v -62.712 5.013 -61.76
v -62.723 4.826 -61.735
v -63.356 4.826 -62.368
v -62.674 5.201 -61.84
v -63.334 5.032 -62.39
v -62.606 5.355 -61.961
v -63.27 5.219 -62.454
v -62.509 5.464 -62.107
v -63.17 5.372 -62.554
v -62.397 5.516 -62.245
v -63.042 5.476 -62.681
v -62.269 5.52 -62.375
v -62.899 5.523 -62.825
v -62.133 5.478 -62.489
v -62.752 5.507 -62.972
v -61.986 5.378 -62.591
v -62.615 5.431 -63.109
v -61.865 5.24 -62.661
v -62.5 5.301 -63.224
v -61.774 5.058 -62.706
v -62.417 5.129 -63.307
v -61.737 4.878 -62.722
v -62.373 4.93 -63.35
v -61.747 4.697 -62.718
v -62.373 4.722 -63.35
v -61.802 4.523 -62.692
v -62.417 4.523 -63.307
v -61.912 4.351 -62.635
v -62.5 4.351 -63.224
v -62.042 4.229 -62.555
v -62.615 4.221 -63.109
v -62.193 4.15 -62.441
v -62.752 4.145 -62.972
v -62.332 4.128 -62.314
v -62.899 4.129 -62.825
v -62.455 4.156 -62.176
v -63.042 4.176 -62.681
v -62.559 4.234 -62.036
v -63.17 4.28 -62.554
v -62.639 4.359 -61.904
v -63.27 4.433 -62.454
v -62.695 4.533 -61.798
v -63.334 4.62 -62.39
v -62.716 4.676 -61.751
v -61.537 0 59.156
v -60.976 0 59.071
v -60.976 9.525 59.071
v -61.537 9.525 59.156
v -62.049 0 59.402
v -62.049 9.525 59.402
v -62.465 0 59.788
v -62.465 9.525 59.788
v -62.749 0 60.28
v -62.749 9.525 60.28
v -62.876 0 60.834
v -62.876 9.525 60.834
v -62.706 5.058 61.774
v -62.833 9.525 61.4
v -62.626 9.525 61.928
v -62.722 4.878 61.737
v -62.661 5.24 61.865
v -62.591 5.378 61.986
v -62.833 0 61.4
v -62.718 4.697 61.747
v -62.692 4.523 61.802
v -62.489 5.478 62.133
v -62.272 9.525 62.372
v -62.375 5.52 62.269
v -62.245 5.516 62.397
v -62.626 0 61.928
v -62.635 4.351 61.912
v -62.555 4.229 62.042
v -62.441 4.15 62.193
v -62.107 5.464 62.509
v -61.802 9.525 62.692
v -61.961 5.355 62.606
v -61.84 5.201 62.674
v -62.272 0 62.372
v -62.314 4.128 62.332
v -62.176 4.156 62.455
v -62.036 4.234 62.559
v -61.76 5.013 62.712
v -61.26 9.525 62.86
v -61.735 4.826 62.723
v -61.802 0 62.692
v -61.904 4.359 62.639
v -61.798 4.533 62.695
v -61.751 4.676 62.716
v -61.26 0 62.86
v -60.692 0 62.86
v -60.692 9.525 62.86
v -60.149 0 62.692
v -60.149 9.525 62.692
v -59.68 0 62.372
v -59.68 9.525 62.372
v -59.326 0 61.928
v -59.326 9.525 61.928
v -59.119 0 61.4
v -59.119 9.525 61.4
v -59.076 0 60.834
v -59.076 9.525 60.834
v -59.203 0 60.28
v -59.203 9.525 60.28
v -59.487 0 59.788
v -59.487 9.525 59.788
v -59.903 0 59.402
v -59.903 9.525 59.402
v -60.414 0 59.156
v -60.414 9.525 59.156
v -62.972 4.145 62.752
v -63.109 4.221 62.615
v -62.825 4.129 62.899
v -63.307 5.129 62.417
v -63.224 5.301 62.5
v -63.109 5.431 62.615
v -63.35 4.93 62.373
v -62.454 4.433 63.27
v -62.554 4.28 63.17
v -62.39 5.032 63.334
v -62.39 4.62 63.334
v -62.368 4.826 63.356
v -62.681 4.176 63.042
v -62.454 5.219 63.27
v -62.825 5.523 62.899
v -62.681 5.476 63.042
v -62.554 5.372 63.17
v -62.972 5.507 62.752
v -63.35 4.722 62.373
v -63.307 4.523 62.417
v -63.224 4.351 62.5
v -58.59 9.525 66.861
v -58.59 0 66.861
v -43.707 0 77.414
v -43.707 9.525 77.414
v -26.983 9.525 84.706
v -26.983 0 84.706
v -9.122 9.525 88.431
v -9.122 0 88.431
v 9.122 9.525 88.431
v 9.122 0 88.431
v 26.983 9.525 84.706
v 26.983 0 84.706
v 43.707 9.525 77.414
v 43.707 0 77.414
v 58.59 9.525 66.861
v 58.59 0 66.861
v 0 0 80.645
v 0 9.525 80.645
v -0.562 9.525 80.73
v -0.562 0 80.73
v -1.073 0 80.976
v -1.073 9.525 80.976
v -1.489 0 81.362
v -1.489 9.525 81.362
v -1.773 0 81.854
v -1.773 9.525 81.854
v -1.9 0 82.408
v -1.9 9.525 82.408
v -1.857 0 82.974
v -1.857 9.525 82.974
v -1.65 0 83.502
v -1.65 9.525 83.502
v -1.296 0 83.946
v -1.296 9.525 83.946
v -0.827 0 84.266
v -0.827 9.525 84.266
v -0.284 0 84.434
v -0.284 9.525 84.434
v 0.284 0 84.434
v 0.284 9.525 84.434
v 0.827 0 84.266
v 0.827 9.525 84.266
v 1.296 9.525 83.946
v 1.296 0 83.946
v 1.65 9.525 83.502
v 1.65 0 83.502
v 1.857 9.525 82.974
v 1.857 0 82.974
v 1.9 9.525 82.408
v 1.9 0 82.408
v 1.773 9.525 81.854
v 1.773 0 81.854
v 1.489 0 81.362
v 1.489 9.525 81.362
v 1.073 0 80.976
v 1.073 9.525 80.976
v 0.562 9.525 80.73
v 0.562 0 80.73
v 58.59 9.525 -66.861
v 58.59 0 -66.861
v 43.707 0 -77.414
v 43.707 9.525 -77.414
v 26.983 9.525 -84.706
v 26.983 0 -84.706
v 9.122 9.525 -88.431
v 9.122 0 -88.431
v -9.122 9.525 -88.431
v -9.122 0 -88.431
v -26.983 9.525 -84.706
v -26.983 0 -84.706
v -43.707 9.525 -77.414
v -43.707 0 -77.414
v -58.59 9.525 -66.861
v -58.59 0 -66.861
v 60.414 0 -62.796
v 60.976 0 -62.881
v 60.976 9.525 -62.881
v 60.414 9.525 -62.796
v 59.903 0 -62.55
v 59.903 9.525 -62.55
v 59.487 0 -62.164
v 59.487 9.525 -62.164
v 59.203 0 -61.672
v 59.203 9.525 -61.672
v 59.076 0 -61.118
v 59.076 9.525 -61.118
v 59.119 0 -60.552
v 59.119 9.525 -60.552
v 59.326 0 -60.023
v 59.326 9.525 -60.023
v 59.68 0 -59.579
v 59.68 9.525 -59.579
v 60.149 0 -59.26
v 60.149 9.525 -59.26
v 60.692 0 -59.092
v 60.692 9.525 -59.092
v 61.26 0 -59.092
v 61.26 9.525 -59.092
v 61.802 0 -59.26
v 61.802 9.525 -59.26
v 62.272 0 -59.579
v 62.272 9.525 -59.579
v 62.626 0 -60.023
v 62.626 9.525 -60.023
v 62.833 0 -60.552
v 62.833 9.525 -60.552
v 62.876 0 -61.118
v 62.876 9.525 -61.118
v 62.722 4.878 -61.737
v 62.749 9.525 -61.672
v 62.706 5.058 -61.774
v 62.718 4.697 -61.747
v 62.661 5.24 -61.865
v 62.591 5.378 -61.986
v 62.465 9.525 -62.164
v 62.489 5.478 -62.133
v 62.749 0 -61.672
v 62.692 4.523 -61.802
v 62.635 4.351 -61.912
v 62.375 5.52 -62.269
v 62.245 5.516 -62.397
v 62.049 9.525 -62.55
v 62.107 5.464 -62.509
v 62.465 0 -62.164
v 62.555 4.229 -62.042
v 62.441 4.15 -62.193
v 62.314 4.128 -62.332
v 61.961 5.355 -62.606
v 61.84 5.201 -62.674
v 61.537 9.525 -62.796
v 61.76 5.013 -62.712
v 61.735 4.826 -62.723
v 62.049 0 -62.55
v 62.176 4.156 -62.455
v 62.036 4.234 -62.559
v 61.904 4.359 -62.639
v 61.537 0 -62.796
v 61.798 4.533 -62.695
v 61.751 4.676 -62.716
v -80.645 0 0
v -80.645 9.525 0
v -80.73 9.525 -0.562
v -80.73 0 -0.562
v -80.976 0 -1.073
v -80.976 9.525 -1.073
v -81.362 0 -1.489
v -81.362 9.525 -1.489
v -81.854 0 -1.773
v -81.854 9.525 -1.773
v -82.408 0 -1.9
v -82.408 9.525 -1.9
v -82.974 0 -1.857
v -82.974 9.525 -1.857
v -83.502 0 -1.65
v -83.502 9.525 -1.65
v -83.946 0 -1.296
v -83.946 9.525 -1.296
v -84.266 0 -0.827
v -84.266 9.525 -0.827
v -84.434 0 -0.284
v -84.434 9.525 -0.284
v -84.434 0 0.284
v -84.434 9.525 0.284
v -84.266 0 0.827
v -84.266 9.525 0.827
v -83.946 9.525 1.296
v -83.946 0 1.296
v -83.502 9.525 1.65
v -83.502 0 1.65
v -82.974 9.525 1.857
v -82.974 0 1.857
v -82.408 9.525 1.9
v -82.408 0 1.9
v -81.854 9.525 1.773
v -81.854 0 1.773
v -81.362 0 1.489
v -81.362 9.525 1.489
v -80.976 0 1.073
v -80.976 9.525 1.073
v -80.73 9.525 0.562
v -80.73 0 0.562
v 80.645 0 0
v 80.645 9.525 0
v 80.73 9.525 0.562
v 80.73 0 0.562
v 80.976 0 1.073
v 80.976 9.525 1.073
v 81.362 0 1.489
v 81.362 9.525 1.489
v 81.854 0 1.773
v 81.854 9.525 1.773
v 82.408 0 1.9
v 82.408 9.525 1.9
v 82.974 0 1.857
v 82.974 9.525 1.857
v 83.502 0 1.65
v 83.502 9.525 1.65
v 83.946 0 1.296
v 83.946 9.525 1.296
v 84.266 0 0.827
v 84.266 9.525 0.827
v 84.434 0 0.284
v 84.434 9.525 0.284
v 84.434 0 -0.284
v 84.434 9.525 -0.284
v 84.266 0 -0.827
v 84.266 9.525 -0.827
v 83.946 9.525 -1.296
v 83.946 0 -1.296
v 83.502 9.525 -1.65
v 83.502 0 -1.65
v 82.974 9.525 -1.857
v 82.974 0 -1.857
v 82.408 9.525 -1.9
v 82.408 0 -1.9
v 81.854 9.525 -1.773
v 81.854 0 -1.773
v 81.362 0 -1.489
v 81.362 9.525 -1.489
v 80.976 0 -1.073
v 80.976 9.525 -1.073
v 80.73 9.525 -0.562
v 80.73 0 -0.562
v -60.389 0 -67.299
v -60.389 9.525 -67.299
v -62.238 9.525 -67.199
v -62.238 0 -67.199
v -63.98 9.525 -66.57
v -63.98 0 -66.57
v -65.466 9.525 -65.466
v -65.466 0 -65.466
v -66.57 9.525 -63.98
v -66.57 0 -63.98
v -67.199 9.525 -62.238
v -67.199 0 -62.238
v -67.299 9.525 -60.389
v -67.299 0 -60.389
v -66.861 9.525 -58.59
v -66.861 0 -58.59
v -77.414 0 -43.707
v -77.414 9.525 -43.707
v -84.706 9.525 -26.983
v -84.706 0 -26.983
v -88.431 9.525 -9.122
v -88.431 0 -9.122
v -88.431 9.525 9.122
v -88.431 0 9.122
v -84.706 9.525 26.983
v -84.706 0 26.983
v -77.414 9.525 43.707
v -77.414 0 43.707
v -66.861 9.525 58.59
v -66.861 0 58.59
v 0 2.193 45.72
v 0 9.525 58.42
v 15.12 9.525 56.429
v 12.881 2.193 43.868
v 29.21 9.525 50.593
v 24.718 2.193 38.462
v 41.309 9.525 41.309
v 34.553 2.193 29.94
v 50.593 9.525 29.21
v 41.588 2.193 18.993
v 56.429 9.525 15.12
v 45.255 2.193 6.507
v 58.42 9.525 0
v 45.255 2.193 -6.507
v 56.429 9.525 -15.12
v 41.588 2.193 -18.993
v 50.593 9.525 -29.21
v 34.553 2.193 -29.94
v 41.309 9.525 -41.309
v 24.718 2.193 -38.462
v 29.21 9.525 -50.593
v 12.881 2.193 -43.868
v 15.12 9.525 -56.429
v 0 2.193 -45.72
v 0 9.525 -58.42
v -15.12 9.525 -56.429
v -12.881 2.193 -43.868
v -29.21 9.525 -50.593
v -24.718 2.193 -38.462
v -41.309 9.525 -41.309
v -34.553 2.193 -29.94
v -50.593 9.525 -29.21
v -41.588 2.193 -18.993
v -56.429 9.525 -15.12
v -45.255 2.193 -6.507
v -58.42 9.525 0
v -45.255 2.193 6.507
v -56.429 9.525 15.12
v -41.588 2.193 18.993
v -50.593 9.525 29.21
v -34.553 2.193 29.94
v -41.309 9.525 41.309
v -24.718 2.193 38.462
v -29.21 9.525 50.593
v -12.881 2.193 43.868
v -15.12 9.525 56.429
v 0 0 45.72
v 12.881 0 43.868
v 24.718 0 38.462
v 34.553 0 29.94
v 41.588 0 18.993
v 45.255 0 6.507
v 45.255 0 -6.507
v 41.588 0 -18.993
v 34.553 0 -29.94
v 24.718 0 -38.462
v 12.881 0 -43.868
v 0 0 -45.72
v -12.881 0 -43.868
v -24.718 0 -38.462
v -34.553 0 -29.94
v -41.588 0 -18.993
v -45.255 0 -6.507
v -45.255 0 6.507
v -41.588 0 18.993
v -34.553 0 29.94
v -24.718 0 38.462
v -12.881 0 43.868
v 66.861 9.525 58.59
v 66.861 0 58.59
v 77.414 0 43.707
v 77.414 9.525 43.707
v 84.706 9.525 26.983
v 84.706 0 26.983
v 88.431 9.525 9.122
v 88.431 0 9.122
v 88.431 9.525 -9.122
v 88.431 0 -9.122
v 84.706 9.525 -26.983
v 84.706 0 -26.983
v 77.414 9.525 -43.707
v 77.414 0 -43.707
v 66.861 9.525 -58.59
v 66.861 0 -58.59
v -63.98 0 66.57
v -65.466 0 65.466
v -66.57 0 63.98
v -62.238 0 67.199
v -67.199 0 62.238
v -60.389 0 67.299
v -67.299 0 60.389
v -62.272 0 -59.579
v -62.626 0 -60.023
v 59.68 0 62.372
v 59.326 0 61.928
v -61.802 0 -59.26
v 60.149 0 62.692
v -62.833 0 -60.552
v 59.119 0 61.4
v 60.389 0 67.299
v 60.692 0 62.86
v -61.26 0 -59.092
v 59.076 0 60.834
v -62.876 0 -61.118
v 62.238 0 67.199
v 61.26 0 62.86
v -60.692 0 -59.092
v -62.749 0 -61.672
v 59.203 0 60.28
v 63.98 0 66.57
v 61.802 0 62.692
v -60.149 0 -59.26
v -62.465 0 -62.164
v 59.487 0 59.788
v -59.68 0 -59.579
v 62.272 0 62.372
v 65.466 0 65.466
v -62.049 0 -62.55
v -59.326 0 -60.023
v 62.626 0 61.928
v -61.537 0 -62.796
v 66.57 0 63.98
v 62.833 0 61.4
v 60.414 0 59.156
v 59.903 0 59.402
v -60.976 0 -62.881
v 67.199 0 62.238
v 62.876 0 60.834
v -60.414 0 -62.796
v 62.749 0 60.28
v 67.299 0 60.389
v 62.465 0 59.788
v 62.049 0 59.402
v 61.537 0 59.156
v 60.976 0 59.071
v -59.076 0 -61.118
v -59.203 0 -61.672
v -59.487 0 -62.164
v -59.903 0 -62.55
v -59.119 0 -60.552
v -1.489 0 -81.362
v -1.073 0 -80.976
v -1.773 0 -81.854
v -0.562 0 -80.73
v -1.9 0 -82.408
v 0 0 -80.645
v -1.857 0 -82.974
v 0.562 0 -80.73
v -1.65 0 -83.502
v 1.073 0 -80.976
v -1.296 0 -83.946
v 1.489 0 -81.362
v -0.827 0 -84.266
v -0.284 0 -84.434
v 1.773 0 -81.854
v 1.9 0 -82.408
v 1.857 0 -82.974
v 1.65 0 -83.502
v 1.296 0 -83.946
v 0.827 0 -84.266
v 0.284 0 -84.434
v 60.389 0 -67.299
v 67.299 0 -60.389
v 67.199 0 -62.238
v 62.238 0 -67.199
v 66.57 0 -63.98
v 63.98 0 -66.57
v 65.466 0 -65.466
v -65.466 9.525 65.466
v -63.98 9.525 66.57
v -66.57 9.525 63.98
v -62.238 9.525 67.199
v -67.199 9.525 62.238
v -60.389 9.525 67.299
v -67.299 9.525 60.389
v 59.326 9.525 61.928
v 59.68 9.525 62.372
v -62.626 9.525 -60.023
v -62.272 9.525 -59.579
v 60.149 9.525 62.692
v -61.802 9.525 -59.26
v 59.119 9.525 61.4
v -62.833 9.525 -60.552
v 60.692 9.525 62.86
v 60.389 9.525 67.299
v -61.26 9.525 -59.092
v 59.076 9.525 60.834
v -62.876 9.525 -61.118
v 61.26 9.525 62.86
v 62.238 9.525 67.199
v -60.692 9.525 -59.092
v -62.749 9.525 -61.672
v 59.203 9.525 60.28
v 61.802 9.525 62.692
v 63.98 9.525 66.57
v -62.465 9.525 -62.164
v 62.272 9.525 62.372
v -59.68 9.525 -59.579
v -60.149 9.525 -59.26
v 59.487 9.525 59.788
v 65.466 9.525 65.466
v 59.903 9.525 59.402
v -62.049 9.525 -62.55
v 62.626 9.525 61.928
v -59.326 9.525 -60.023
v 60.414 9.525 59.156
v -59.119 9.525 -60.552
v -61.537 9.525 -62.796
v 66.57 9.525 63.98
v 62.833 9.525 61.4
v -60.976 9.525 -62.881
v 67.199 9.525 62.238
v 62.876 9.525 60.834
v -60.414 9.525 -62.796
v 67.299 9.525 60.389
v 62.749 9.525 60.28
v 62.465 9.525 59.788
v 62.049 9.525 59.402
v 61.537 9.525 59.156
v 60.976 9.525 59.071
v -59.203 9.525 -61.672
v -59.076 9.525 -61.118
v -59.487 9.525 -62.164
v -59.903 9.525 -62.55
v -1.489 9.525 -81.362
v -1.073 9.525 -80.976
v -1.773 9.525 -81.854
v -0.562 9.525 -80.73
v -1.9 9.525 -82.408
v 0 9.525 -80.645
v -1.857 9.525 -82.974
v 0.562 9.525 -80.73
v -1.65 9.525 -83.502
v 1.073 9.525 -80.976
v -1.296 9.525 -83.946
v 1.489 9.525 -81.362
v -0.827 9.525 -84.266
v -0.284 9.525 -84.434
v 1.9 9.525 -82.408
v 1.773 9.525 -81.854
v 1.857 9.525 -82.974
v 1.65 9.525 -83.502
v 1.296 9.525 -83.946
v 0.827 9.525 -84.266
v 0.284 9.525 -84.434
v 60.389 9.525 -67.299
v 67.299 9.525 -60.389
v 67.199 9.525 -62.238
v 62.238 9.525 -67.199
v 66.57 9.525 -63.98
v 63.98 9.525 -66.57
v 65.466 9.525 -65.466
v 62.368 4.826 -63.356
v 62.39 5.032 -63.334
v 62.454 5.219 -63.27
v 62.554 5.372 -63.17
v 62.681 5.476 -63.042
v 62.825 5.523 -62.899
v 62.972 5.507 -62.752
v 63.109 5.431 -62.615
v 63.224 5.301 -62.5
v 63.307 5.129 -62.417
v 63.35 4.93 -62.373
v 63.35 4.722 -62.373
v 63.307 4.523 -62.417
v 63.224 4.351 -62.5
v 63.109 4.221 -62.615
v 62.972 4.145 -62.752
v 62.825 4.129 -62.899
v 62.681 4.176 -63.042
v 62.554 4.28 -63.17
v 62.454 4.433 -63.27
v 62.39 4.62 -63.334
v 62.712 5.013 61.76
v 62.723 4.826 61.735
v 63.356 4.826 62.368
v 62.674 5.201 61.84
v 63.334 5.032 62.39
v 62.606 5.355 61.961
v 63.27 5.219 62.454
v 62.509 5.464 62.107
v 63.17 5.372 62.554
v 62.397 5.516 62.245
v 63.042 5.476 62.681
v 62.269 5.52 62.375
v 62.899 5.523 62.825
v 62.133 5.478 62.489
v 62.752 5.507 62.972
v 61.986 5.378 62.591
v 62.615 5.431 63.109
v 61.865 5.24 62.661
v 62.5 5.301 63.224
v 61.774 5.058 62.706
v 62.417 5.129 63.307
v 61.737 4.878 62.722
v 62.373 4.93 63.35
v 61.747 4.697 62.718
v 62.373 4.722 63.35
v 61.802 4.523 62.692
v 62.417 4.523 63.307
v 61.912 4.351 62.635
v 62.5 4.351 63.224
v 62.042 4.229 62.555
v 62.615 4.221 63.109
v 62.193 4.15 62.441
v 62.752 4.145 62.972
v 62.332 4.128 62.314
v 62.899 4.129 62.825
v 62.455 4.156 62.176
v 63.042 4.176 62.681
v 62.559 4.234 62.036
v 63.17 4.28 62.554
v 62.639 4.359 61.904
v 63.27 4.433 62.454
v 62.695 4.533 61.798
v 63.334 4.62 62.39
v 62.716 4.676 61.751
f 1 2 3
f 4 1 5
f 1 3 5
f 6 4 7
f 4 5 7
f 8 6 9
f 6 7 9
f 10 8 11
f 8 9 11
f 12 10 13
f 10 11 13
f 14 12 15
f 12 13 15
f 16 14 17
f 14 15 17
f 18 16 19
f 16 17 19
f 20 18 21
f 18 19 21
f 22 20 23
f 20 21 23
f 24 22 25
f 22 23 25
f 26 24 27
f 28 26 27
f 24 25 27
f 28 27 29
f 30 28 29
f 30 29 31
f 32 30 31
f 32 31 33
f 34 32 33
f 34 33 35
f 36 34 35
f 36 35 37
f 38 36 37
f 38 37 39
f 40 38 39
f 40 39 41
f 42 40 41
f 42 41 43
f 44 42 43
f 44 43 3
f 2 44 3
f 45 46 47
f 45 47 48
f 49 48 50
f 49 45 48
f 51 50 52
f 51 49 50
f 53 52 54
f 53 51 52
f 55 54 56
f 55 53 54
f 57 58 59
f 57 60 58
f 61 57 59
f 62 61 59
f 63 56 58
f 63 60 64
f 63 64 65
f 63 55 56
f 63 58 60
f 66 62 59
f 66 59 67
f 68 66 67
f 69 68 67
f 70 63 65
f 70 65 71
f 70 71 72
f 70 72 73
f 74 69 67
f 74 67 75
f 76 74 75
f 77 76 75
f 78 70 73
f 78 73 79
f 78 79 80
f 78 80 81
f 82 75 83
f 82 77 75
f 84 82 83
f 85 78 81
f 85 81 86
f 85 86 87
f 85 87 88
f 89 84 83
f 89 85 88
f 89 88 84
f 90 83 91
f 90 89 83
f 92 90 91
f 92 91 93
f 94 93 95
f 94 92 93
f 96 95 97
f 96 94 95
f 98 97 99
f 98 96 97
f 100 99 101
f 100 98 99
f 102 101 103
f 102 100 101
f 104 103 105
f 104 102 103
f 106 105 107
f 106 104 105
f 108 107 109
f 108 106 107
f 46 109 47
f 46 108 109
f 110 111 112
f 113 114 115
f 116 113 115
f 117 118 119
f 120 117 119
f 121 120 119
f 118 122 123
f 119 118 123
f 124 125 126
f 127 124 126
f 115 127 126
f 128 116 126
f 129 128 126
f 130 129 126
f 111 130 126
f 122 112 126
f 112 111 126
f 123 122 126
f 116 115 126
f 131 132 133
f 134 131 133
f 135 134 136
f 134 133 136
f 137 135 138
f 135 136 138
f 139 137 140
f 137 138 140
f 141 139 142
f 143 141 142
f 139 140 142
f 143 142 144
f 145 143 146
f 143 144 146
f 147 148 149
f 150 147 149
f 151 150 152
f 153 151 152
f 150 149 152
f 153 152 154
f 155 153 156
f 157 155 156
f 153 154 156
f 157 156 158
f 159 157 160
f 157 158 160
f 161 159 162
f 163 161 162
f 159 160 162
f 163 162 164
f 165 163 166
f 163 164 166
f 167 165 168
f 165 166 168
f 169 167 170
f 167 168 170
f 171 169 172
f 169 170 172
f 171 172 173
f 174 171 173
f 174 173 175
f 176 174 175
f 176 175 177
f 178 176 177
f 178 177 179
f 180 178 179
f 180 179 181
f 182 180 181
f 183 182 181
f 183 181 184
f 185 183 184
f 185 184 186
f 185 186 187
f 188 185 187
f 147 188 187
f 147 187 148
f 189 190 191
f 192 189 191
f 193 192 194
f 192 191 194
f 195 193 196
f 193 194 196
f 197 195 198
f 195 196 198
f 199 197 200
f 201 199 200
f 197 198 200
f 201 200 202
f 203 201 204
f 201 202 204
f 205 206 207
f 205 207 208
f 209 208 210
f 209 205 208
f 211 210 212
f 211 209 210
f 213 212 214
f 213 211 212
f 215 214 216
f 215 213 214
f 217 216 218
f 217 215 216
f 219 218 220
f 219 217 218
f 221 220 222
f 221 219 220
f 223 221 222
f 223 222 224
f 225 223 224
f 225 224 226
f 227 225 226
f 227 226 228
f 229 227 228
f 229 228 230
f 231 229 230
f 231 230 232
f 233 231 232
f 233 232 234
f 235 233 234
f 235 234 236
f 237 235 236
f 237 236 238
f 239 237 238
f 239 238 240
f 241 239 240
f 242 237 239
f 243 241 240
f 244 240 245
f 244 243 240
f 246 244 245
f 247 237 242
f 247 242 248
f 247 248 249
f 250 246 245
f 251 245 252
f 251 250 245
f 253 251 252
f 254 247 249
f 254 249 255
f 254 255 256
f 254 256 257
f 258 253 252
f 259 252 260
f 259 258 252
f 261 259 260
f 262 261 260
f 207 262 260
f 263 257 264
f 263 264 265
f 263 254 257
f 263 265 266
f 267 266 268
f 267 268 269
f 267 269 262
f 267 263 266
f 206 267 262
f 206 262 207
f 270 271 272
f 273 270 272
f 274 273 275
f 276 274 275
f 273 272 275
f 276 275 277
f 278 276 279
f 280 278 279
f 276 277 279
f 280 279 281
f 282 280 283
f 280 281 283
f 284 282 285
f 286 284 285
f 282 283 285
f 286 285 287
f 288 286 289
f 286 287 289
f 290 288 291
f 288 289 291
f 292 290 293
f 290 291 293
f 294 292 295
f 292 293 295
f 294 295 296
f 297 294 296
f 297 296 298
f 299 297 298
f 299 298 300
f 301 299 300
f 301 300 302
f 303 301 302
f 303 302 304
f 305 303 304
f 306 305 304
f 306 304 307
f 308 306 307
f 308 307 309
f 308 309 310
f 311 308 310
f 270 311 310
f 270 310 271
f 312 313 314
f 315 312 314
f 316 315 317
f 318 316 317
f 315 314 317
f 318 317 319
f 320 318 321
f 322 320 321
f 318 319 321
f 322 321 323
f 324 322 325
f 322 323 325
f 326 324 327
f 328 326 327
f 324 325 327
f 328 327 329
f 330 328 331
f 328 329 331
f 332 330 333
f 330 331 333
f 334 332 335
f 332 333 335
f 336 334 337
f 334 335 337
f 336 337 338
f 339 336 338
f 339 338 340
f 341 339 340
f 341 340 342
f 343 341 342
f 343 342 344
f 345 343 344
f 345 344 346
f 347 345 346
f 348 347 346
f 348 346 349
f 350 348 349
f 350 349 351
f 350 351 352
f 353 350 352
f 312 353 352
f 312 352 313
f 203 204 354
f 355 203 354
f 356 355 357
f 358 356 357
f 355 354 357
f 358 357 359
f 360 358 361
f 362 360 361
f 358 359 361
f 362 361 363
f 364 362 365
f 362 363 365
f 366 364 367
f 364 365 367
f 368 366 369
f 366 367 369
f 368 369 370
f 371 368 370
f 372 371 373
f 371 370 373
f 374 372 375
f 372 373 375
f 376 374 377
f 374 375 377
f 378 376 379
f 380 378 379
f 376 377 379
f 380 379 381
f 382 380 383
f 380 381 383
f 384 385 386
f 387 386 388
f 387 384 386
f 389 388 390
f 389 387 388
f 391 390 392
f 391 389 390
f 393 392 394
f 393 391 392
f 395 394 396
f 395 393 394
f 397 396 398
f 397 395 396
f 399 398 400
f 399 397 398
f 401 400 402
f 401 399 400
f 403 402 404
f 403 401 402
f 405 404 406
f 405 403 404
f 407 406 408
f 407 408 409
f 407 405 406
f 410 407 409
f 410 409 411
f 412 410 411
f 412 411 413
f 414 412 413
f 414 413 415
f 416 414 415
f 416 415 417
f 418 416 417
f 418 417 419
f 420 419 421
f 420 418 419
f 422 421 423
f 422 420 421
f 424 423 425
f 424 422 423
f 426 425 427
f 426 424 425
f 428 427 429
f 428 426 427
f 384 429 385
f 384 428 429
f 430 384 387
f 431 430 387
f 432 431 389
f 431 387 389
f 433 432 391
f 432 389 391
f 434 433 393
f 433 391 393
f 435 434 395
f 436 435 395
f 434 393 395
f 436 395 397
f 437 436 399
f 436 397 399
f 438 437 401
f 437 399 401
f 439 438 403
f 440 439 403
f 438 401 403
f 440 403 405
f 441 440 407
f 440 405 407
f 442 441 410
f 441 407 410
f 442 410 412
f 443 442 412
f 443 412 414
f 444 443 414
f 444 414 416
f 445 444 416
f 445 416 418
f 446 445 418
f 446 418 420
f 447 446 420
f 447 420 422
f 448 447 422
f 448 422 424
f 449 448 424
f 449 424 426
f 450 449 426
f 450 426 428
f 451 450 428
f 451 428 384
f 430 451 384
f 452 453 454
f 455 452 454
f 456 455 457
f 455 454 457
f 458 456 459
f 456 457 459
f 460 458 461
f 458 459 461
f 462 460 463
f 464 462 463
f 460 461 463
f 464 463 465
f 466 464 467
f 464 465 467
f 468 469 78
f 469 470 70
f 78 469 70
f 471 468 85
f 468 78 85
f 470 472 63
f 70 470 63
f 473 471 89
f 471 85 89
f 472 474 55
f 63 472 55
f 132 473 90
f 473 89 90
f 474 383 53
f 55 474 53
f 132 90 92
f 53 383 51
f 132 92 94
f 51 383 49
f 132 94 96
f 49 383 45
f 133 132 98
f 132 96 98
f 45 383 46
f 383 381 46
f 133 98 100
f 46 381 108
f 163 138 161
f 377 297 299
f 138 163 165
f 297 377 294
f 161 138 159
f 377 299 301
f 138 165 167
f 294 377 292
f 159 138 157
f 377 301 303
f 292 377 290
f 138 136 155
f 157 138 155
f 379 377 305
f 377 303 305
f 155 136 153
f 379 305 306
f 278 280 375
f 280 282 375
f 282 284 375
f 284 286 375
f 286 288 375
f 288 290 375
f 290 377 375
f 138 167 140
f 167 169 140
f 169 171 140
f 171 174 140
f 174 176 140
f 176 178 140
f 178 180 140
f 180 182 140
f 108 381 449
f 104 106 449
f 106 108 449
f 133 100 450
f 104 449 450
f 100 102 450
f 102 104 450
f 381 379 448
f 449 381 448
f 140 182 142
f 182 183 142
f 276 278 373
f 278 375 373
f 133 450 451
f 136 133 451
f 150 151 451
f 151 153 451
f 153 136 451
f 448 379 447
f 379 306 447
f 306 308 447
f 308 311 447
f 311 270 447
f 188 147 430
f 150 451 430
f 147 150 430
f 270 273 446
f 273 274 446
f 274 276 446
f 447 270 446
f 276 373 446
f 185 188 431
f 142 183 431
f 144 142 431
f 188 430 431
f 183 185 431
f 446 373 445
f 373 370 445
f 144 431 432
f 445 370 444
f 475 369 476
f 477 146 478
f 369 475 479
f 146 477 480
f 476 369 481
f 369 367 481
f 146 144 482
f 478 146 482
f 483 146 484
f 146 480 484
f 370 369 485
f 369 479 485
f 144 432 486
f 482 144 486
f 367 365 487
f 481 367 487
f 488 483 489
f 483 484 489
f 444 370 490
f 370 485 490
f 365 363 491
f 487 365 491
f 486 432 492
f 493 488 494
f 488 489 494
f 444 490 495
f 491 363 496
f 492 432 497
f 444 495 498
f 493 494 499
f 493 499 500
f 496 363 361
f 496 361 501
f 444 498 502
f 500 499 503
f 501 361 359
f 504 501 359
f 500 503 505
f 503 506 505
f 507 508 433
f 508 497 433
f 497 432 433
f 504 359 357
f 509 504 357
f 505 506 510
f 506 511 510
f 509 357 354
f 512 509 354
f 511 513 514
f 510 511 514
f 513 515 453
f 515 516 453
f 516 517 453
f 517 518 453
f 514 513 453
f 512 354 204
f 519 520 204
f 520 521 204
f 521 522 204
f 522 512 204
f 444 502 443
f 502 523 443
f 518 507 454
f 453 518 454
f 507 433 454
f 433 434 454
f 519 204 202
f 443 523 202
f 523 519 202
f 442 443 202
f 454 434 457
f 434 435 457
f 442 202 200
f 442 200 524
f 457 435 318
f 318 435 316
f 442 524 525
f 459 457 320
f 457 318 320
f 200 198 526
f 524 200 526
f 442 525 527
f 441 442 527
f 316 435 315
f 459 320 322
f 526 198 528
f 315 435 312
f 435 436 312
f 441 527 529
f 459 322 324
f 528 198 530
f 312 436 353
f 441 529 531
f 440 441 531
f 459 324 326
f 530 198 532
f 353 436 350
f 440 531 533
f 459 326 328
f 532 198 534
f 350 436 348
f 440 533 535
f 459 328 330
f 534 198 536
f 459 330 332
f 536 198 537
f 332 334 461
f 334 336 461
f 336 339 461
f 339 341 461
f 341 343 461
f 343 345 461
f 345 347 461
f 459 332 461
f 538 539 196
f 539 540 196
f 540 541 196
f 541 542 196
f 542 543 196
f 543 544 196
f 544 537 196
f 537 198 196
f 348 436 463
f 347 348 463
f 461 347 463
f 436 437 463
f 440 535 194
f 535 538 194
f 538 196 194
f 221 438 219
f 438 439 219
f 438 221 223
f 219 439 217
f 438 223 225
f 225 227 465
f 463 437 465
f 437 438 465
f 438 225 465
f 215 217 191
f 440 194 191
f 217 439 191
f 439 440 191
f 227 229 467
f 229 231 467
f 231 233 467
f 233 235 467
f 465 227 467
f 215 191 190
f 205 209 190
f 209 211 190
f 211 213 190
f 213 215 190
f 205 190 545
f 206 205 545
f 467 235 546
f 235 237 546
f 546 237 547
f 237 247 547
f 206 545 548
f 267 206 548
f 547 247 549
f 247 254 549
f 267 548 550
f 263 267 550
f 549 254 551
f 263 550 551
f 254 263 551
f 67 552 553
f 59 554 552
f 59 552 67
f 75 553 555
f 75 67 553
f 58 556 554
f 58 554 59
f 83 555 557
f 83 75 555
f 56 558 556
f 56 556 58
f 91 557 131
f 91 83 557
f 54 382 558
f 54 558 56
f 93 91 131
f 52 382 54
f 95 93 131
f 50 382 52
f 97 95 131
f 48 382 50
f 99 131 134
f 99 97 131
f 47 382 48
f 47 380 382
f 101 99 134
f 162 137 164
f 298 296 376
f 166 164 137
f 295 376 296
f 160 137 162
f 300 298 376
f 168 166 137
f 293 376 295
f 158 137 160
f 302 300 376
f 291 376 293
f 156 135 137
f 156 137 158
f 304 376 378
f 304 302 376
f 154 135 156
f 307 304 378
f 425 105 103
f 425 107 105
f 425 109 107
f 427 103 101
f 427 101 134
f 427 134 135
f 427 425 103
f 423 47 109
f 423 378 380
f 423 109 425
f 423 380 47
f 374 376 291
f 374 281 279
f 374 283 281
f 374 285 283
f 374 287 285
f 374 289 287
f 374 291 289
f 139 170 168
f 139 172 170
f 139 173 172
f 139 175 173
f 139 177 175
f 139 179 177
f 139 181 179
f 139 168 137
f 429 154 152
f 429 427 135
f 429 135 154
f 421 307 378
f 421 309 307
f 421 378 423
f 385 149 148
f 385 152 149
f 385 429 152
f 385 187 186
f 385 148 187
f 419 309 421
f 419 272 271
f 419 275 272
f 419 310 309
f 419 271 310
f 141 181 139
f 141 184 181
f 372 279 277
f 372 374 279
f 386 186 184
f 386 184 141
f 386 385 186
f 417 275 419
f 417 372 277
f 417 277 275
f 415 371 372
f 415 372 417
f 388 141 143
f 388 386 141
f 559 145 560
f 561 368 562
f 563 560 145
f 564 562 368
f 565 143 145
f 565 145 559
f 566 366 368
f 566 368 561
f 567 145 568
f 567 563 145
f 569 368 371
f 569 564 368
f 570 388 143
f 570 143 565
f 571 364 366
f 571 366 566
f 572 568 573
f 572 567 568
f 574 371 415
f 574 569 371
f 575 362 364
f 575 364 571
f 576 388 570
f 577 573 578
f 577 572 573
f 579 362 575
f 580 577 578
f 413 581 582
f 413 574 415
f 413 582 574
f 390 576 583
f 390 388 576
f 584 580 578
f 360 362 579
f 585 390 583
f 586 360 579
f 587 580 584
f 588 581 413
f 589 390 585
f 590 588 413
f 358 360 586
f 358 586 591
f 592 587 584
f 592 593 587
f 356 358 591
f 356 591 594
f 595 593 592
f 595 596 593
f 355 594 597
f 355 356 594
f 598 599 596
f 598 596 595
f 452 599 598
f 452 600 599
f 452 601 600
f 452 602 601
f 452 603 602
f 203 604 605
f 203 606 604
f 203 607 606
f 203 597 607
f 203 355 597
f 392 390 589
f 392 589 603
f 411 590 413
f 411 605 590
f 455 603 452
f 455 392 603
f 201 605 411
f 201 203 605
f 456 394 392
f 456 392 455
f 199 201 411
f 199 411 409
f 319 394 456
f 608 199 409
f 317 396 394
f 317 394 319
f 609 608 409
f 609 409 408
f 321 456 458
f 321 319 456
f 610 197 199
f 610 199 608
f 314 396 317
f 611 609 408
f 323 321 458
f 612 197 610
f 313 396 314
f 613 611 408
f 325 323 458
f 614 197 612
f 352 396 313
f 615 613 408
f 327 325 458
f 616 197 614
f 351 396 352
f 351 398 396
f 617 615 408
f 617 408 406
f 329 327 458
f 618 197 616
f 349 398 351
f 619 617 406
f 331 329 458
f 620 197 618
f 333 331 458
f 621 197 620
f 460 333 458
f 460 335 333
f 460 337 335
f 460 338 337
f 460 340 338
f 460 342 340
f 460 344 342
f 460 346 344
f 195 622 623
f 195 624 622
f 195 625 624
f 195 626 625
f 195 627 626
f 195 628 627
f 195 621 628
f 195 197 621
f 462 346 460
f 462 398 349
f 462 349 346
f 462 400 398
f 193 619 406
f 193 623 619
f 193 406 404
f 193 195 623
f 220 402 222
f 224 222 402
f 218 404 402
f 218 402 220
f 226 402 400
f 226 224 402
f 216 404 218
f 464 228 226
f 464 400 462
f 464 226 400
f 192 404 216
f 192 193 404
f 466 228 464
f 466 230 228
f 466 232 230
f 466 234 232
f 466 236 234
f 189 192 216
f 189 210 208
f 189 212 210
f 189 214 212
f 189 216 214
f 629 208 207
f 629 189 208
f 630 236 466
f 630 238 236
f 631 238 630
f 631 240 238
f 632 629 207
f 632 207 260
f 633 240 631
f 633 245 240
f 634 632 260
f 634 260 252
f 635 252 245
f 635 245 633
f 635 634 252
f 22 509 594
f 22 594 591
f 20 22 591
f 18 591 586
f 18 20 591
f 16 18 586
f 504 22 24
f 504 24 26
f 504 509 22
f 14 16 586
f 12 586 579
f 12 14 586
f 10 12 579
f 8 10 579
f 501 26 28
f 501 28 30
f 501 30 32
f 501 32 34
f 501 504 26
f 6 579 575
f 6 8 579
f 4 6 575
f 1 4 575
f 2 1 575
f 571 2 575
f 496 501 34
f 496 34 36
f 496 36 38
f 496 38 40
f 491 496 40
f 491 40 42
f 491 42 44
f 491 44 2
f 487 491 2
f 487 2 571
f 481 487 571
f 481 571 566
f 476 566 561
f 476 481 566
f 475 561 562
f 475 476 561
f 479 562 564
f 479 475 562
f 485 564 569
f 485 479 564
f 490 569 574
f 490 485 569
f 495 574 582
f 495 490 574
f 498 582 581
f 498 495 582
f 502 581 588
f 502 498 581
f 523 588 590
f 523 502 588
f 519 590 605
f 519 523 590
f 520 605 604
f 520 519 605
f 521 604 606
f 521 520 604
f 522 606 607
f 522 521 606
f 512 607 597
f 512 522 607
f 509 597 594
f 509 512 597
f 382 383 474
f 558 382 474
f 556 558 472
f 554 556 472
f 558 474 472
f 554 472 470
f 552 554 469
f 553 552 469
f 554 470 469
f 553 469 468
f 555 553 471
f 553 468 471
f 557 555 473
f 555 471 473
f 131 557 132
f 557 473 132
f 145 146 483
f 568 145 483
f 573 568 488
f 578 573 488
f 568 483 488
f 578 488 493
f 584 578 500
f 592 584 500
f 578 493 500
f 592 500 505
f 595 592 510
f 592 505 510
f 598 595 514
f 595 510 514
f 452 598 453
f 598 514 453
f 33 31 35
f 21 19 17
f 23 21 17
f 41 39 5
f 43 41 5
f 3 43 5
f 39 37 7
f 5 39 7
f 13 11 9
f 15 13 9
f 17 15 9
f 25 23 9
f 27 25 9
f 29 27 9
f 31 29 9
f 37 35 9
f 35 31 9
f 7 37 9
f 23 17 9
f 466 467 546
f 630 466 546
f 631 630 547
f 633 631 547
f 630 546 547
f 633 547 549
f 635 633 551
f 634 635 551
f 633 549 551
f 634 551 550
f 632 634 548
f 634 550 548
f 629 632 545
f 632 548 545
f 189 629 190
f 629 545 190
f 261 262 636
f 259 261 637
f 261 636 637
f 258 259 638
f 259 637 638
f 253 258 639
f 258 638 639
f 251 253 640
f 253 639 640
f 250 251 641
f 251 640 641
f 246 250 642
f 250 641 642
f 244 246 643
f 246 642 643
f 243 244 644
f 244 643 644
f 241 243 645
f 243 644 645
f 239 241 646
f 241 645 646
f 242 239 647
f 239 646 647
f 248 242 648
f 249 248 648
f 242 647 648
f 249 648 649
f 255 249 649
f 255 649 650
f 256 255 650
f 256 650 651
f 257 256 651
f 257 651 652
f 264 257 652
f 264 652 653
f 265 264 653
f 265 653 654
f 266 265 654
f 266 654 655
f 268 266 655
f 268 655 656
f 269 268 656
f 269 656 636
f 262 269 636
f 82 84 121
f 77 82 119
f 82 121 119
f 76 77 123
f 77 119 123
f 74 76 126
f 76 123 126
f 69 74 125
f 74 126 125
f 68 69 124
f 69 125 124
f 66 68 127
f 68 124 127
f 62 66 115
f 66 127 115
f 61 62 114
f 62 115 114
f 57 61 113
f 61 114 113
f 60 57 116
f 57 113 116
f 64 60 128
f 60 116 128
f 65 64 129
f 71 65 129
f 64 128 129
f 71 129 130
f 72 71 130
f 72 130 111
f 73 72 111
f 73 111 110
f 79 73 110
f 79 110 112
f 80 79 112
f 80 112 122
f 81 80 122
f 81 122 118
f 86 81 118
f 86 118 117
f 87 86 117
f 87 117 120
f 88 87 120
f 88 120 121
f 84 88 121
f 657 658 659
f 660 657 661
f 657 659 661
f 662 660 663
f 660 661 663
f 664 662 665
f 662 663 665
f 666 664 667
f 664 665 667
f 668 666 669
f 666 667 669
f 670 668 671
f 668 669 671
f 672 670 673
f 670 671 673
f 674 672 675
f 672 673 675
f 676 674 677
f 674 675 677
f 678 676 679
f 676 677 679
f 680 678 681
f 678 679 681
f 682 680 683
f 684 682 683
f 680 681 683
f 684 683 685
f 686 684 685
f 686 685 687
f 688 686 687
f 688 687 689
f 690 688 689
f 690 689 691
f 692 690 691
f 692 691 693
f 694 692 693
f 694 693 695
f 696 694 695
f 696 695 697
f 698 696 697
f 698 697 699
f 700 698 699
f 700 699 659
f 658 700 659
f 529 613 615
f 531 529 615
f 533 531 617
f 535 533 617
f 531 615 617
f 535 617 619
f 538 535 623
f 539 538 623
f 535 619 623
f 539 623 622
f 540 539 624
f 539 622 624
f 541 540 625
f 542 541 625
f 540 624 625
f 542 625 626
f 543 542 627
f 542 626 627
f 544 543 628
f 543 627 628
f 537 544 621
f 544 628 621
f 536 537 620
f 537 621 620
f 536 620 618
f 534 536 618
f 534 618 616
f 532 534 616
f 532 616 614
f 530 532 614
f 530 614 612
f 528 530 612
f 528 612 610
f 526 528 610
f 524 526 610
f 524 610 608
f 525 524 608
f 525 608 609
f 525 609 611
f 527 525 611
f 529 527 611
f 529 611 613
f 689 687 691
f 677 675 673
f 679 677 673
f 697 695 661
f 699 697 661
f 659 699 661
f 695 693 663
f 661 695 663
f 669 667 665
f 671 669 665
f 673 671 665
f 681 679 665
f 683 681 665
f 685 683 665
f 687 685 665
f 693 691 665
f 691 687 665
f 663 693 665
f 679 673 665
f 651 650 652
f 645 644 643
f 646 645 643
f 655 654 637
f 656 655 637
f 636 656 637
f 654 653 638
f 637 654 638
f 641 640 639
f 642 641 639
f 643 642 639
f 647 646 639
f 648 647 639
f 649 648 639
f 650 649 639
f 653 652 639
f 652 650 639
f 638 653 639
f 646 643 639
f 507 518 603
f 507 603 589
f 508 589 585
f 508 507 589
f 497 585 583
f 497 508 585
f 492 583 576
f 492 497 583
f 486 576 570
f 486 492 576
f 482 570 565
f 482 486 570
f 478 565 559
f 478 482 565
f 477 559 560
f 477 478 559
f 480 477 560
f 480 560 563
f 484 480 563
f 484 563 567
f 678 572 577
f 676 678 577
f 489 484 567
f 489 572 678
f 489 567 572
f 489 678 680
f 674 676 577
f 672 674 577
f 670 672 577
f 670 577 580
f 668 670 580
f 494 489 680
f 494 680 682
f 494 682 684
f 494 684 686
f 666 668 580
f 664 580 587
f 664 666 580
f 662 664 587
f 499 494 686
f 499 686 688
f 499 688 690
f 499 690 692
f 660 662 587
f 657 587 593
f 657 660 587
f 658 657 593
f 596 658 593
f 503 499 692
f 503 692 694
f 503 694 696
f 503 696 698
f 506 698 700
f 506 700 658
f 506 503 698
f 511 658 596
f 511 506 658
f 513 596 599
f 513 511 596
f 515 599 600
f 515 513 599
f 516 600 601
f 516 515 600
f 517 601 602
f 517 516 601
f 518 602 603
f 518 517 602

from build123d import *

# Parameters (mm, degrees)
SKETCH1_R           = 1.905
BOSS_EXTRUDE1_DEPTH = 9.525
SKETCH2_R           = 45.72
CUT_EXTRUDE1_DEPTH  = 12.7
SKETCH4_R           = 1.905
CUT_EXTRUDE3_DEPTH  = 12.7
CIRPATTERN2_COUNT   = 4
SKETCH10_R          = 0.6985
CUT_EXTRUDE5_DEPTH  = 3.175
CIRPATTERN5_COUNT   = 4
CHAMFER1_SIZE       = 12.7
CHAMFER1_SIZE2      = 7.332348419


with BuildPart() as part:
    # Sketch1 → Boss-Extrude1 (new body)
    with BuildSketch(Plane(origin=(0, 0, 0), x_dir=(1, 0, 0), z_dir=(0, 1, 0))):
        with BuildLine():
            ThreePointArc((-66.860826677, 58.590441679), (-88.9, 0), (-66.860826677, -58.590441679))
            ThreePointArc((-66.860826677, -58.590441679), (-65.466067123, -65.466067123), (-58.590441679, -66.860826677))
            ThreePointArc((-58.590441679, -66.860826677), (0, -88.9), (58.590441679, -66.860826677))
            ThreePointArc((58.590441679, -66.860826677), (65.466067123, -65.466067123), (66.860826677, -58.590441679))
            ThreePointArc((66.860826677, -58.590441679), (88.9, 0), (66.860826677, 58.590441679))
            ThreePointArc((66.860826677, 58.590441679), (65.466067123, 65.466067123), (58.590441679, 66.860826677))
            ThreePointArc((58.590441679, 66.860826677), (0, 88.9), (-58.590441679, 66.860826677))
            ThreePointArc((-58.590441679, 66.860826677), (-65.466067123, 65.466067123), (-66.860826677, 58.590441679))
        make_face()
        with Locations(Location((-60.975939062, 60.975939062, 0), (0, 0, 90))):
            Circle(SKETCH1_R, mode=Mode.SUBTRACT)
        with Locations(Location((60.975939062, 60.975939062, 0), (0, 0, 90))):
            Circle(SKETCH1_R, mode=Mode.SUBTRACT)
        with Locations(Location((60.975939062, -60.975939062, 0), (0, 0, 90))):
            Circle(SKETCH1_R, mode=Mode.SUBTRACT)
        with Locations(Location((-60.975939062, -60.975939062, 0), (0, 0, 90))):
            Circle(SKETCH1_R, mode=Mode.SUBTRACT)
    extrude(amount=BOSS_EXTRUDE1_DEPTH)

    # Sketch2 → Cut-Extrude1 (cut)
    with BuildSketch(Plane(origin=(0, 9.525, 0), x_dir=(1, 0, 0), z_dir=(0, 1, 0))):
        with Locations(Location((0, 0, 0), (0, 0, 270))):
            Circle(SKETCH2_R)
    extrude(amount=-CUT_EXTRUDE1_DEPTH, mode=Mode.SUBTRACT)

    # Sketch4 → Cut-Extrude3 (cut)
    with BuildSketch(Plane(origin=(0, 9.525, 0), x_dir=(1, 0, 0), z_dir=(0, 1, 0))):
        with Locations(Location((0, 82.55, 0), (0, 0, 270))):
            Circle(SKETCH4_R)
    cut_extrude3 = extrude(amount=-CUT_EXTRUDE3_DEPTH, mode=Mode.SUBTRACT)

    # CirPattern2: Cut-Extrude3 ×4 about axis
    cirpattern2_axis = Axis((0, 0, 0), (0, 1, 0))
    for i in range(1, CIRPATTERN2_COUNT):
        add(cut_extrude3.rotate(cirpattern2_axis, i * 360 / CIRPATTERN2_COUNT), mode=Mode.SUBTRACT)

    # Sketch10 → Cut-Extrude5 (cut)
    with BuildSketch(Plane(origin=(-62.861792847, 0, -62.861792847), x_dir=(0, -1, 0), z_dir=(-0.7071067811865464, 0, -0.7071067811865488))):
        with Locations(Location((-4.826, 0, 0), (0, 0, 90))):
            Circle(SKETCH10_R)
    cut_extrude5 = extrude(amount=-CUT_EXTRUDE5_DEPTH, mode=Mode.SUBTRACT)

    # CirPattern5: Cut-Extrude5 ×4 about axis
    cirpattern5_axis = Axis((0, 0, 0), (0, 1, 0))
    for i in range(1, CIRPATTERN5_COUNT):
        add(cut_extrude5.rotate(cirpattern5_axis, i * 360 / CIRPATTERN5_COUNT), mode=Mode.SUBTRACT)

    # Chamfer1
    chamfer1_edges = [part.edges().sort_by_distance(p)[0] for p in [
        (0, 9.525, -45.72),
    ]]
    chamfer1_side = [part.faces().sort_by_distance(p)[0] for p in [
        (0, 9.525, -86.385528286),
    ]]
    chamfer(chamfer1_edges, length=CHAMFER1_SIZE, length2=CHAMFER1_SIZE2, reference=chamfer1_side[0])


solid = part.part
